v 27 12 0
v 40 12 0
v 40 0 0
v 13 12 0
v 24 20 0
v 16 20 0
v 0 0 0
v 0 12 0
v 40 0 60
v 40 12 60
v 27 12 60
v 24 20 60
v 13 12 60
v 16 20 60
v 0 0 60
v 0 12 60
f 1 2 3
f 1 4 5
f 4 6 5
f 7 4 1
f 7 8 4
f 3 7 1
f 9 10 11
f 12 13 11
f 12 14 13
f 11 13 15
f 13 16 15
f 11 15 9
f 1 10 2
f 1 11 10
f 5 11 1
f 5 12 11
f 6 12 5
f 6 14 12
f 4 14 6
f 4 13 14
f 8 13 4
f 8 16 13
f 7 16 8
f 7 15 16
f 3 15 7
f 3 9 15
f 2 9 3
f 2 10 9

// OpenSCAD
$fn = 32;

// ----------------------------------------------------------------------
// V guide rail: dovetail, 40 mm wide
// ----------------------------------------------------------------------

// --- parameters (mm) ---
rail_w = 40;              // rail width, X
base_t = 12;              // base plate thickness
v_depth = 8;              // V feature depth / height
v_half_w = 7;             // half width of the V at the base face
plate_t = 60;             // rail length, Z (the extrusion height)
top_half_w = 4;           // half width at the dovetail top

dovetail_base = 2 * v_half_w;  // dovetail width at the base
dovetail_top = 2 * top_half_w;  // dovetail width at the top

profile = [[0, 0], [40, 0], [40, 12], [27, 12], [24, 20], [16, 20], [13, 12], [0, 12]];  // primary outline, 8 points, counter clockwise

// --- the one profile operation ---
linear_extrude(height = plate_t) polygon(points = profile);
